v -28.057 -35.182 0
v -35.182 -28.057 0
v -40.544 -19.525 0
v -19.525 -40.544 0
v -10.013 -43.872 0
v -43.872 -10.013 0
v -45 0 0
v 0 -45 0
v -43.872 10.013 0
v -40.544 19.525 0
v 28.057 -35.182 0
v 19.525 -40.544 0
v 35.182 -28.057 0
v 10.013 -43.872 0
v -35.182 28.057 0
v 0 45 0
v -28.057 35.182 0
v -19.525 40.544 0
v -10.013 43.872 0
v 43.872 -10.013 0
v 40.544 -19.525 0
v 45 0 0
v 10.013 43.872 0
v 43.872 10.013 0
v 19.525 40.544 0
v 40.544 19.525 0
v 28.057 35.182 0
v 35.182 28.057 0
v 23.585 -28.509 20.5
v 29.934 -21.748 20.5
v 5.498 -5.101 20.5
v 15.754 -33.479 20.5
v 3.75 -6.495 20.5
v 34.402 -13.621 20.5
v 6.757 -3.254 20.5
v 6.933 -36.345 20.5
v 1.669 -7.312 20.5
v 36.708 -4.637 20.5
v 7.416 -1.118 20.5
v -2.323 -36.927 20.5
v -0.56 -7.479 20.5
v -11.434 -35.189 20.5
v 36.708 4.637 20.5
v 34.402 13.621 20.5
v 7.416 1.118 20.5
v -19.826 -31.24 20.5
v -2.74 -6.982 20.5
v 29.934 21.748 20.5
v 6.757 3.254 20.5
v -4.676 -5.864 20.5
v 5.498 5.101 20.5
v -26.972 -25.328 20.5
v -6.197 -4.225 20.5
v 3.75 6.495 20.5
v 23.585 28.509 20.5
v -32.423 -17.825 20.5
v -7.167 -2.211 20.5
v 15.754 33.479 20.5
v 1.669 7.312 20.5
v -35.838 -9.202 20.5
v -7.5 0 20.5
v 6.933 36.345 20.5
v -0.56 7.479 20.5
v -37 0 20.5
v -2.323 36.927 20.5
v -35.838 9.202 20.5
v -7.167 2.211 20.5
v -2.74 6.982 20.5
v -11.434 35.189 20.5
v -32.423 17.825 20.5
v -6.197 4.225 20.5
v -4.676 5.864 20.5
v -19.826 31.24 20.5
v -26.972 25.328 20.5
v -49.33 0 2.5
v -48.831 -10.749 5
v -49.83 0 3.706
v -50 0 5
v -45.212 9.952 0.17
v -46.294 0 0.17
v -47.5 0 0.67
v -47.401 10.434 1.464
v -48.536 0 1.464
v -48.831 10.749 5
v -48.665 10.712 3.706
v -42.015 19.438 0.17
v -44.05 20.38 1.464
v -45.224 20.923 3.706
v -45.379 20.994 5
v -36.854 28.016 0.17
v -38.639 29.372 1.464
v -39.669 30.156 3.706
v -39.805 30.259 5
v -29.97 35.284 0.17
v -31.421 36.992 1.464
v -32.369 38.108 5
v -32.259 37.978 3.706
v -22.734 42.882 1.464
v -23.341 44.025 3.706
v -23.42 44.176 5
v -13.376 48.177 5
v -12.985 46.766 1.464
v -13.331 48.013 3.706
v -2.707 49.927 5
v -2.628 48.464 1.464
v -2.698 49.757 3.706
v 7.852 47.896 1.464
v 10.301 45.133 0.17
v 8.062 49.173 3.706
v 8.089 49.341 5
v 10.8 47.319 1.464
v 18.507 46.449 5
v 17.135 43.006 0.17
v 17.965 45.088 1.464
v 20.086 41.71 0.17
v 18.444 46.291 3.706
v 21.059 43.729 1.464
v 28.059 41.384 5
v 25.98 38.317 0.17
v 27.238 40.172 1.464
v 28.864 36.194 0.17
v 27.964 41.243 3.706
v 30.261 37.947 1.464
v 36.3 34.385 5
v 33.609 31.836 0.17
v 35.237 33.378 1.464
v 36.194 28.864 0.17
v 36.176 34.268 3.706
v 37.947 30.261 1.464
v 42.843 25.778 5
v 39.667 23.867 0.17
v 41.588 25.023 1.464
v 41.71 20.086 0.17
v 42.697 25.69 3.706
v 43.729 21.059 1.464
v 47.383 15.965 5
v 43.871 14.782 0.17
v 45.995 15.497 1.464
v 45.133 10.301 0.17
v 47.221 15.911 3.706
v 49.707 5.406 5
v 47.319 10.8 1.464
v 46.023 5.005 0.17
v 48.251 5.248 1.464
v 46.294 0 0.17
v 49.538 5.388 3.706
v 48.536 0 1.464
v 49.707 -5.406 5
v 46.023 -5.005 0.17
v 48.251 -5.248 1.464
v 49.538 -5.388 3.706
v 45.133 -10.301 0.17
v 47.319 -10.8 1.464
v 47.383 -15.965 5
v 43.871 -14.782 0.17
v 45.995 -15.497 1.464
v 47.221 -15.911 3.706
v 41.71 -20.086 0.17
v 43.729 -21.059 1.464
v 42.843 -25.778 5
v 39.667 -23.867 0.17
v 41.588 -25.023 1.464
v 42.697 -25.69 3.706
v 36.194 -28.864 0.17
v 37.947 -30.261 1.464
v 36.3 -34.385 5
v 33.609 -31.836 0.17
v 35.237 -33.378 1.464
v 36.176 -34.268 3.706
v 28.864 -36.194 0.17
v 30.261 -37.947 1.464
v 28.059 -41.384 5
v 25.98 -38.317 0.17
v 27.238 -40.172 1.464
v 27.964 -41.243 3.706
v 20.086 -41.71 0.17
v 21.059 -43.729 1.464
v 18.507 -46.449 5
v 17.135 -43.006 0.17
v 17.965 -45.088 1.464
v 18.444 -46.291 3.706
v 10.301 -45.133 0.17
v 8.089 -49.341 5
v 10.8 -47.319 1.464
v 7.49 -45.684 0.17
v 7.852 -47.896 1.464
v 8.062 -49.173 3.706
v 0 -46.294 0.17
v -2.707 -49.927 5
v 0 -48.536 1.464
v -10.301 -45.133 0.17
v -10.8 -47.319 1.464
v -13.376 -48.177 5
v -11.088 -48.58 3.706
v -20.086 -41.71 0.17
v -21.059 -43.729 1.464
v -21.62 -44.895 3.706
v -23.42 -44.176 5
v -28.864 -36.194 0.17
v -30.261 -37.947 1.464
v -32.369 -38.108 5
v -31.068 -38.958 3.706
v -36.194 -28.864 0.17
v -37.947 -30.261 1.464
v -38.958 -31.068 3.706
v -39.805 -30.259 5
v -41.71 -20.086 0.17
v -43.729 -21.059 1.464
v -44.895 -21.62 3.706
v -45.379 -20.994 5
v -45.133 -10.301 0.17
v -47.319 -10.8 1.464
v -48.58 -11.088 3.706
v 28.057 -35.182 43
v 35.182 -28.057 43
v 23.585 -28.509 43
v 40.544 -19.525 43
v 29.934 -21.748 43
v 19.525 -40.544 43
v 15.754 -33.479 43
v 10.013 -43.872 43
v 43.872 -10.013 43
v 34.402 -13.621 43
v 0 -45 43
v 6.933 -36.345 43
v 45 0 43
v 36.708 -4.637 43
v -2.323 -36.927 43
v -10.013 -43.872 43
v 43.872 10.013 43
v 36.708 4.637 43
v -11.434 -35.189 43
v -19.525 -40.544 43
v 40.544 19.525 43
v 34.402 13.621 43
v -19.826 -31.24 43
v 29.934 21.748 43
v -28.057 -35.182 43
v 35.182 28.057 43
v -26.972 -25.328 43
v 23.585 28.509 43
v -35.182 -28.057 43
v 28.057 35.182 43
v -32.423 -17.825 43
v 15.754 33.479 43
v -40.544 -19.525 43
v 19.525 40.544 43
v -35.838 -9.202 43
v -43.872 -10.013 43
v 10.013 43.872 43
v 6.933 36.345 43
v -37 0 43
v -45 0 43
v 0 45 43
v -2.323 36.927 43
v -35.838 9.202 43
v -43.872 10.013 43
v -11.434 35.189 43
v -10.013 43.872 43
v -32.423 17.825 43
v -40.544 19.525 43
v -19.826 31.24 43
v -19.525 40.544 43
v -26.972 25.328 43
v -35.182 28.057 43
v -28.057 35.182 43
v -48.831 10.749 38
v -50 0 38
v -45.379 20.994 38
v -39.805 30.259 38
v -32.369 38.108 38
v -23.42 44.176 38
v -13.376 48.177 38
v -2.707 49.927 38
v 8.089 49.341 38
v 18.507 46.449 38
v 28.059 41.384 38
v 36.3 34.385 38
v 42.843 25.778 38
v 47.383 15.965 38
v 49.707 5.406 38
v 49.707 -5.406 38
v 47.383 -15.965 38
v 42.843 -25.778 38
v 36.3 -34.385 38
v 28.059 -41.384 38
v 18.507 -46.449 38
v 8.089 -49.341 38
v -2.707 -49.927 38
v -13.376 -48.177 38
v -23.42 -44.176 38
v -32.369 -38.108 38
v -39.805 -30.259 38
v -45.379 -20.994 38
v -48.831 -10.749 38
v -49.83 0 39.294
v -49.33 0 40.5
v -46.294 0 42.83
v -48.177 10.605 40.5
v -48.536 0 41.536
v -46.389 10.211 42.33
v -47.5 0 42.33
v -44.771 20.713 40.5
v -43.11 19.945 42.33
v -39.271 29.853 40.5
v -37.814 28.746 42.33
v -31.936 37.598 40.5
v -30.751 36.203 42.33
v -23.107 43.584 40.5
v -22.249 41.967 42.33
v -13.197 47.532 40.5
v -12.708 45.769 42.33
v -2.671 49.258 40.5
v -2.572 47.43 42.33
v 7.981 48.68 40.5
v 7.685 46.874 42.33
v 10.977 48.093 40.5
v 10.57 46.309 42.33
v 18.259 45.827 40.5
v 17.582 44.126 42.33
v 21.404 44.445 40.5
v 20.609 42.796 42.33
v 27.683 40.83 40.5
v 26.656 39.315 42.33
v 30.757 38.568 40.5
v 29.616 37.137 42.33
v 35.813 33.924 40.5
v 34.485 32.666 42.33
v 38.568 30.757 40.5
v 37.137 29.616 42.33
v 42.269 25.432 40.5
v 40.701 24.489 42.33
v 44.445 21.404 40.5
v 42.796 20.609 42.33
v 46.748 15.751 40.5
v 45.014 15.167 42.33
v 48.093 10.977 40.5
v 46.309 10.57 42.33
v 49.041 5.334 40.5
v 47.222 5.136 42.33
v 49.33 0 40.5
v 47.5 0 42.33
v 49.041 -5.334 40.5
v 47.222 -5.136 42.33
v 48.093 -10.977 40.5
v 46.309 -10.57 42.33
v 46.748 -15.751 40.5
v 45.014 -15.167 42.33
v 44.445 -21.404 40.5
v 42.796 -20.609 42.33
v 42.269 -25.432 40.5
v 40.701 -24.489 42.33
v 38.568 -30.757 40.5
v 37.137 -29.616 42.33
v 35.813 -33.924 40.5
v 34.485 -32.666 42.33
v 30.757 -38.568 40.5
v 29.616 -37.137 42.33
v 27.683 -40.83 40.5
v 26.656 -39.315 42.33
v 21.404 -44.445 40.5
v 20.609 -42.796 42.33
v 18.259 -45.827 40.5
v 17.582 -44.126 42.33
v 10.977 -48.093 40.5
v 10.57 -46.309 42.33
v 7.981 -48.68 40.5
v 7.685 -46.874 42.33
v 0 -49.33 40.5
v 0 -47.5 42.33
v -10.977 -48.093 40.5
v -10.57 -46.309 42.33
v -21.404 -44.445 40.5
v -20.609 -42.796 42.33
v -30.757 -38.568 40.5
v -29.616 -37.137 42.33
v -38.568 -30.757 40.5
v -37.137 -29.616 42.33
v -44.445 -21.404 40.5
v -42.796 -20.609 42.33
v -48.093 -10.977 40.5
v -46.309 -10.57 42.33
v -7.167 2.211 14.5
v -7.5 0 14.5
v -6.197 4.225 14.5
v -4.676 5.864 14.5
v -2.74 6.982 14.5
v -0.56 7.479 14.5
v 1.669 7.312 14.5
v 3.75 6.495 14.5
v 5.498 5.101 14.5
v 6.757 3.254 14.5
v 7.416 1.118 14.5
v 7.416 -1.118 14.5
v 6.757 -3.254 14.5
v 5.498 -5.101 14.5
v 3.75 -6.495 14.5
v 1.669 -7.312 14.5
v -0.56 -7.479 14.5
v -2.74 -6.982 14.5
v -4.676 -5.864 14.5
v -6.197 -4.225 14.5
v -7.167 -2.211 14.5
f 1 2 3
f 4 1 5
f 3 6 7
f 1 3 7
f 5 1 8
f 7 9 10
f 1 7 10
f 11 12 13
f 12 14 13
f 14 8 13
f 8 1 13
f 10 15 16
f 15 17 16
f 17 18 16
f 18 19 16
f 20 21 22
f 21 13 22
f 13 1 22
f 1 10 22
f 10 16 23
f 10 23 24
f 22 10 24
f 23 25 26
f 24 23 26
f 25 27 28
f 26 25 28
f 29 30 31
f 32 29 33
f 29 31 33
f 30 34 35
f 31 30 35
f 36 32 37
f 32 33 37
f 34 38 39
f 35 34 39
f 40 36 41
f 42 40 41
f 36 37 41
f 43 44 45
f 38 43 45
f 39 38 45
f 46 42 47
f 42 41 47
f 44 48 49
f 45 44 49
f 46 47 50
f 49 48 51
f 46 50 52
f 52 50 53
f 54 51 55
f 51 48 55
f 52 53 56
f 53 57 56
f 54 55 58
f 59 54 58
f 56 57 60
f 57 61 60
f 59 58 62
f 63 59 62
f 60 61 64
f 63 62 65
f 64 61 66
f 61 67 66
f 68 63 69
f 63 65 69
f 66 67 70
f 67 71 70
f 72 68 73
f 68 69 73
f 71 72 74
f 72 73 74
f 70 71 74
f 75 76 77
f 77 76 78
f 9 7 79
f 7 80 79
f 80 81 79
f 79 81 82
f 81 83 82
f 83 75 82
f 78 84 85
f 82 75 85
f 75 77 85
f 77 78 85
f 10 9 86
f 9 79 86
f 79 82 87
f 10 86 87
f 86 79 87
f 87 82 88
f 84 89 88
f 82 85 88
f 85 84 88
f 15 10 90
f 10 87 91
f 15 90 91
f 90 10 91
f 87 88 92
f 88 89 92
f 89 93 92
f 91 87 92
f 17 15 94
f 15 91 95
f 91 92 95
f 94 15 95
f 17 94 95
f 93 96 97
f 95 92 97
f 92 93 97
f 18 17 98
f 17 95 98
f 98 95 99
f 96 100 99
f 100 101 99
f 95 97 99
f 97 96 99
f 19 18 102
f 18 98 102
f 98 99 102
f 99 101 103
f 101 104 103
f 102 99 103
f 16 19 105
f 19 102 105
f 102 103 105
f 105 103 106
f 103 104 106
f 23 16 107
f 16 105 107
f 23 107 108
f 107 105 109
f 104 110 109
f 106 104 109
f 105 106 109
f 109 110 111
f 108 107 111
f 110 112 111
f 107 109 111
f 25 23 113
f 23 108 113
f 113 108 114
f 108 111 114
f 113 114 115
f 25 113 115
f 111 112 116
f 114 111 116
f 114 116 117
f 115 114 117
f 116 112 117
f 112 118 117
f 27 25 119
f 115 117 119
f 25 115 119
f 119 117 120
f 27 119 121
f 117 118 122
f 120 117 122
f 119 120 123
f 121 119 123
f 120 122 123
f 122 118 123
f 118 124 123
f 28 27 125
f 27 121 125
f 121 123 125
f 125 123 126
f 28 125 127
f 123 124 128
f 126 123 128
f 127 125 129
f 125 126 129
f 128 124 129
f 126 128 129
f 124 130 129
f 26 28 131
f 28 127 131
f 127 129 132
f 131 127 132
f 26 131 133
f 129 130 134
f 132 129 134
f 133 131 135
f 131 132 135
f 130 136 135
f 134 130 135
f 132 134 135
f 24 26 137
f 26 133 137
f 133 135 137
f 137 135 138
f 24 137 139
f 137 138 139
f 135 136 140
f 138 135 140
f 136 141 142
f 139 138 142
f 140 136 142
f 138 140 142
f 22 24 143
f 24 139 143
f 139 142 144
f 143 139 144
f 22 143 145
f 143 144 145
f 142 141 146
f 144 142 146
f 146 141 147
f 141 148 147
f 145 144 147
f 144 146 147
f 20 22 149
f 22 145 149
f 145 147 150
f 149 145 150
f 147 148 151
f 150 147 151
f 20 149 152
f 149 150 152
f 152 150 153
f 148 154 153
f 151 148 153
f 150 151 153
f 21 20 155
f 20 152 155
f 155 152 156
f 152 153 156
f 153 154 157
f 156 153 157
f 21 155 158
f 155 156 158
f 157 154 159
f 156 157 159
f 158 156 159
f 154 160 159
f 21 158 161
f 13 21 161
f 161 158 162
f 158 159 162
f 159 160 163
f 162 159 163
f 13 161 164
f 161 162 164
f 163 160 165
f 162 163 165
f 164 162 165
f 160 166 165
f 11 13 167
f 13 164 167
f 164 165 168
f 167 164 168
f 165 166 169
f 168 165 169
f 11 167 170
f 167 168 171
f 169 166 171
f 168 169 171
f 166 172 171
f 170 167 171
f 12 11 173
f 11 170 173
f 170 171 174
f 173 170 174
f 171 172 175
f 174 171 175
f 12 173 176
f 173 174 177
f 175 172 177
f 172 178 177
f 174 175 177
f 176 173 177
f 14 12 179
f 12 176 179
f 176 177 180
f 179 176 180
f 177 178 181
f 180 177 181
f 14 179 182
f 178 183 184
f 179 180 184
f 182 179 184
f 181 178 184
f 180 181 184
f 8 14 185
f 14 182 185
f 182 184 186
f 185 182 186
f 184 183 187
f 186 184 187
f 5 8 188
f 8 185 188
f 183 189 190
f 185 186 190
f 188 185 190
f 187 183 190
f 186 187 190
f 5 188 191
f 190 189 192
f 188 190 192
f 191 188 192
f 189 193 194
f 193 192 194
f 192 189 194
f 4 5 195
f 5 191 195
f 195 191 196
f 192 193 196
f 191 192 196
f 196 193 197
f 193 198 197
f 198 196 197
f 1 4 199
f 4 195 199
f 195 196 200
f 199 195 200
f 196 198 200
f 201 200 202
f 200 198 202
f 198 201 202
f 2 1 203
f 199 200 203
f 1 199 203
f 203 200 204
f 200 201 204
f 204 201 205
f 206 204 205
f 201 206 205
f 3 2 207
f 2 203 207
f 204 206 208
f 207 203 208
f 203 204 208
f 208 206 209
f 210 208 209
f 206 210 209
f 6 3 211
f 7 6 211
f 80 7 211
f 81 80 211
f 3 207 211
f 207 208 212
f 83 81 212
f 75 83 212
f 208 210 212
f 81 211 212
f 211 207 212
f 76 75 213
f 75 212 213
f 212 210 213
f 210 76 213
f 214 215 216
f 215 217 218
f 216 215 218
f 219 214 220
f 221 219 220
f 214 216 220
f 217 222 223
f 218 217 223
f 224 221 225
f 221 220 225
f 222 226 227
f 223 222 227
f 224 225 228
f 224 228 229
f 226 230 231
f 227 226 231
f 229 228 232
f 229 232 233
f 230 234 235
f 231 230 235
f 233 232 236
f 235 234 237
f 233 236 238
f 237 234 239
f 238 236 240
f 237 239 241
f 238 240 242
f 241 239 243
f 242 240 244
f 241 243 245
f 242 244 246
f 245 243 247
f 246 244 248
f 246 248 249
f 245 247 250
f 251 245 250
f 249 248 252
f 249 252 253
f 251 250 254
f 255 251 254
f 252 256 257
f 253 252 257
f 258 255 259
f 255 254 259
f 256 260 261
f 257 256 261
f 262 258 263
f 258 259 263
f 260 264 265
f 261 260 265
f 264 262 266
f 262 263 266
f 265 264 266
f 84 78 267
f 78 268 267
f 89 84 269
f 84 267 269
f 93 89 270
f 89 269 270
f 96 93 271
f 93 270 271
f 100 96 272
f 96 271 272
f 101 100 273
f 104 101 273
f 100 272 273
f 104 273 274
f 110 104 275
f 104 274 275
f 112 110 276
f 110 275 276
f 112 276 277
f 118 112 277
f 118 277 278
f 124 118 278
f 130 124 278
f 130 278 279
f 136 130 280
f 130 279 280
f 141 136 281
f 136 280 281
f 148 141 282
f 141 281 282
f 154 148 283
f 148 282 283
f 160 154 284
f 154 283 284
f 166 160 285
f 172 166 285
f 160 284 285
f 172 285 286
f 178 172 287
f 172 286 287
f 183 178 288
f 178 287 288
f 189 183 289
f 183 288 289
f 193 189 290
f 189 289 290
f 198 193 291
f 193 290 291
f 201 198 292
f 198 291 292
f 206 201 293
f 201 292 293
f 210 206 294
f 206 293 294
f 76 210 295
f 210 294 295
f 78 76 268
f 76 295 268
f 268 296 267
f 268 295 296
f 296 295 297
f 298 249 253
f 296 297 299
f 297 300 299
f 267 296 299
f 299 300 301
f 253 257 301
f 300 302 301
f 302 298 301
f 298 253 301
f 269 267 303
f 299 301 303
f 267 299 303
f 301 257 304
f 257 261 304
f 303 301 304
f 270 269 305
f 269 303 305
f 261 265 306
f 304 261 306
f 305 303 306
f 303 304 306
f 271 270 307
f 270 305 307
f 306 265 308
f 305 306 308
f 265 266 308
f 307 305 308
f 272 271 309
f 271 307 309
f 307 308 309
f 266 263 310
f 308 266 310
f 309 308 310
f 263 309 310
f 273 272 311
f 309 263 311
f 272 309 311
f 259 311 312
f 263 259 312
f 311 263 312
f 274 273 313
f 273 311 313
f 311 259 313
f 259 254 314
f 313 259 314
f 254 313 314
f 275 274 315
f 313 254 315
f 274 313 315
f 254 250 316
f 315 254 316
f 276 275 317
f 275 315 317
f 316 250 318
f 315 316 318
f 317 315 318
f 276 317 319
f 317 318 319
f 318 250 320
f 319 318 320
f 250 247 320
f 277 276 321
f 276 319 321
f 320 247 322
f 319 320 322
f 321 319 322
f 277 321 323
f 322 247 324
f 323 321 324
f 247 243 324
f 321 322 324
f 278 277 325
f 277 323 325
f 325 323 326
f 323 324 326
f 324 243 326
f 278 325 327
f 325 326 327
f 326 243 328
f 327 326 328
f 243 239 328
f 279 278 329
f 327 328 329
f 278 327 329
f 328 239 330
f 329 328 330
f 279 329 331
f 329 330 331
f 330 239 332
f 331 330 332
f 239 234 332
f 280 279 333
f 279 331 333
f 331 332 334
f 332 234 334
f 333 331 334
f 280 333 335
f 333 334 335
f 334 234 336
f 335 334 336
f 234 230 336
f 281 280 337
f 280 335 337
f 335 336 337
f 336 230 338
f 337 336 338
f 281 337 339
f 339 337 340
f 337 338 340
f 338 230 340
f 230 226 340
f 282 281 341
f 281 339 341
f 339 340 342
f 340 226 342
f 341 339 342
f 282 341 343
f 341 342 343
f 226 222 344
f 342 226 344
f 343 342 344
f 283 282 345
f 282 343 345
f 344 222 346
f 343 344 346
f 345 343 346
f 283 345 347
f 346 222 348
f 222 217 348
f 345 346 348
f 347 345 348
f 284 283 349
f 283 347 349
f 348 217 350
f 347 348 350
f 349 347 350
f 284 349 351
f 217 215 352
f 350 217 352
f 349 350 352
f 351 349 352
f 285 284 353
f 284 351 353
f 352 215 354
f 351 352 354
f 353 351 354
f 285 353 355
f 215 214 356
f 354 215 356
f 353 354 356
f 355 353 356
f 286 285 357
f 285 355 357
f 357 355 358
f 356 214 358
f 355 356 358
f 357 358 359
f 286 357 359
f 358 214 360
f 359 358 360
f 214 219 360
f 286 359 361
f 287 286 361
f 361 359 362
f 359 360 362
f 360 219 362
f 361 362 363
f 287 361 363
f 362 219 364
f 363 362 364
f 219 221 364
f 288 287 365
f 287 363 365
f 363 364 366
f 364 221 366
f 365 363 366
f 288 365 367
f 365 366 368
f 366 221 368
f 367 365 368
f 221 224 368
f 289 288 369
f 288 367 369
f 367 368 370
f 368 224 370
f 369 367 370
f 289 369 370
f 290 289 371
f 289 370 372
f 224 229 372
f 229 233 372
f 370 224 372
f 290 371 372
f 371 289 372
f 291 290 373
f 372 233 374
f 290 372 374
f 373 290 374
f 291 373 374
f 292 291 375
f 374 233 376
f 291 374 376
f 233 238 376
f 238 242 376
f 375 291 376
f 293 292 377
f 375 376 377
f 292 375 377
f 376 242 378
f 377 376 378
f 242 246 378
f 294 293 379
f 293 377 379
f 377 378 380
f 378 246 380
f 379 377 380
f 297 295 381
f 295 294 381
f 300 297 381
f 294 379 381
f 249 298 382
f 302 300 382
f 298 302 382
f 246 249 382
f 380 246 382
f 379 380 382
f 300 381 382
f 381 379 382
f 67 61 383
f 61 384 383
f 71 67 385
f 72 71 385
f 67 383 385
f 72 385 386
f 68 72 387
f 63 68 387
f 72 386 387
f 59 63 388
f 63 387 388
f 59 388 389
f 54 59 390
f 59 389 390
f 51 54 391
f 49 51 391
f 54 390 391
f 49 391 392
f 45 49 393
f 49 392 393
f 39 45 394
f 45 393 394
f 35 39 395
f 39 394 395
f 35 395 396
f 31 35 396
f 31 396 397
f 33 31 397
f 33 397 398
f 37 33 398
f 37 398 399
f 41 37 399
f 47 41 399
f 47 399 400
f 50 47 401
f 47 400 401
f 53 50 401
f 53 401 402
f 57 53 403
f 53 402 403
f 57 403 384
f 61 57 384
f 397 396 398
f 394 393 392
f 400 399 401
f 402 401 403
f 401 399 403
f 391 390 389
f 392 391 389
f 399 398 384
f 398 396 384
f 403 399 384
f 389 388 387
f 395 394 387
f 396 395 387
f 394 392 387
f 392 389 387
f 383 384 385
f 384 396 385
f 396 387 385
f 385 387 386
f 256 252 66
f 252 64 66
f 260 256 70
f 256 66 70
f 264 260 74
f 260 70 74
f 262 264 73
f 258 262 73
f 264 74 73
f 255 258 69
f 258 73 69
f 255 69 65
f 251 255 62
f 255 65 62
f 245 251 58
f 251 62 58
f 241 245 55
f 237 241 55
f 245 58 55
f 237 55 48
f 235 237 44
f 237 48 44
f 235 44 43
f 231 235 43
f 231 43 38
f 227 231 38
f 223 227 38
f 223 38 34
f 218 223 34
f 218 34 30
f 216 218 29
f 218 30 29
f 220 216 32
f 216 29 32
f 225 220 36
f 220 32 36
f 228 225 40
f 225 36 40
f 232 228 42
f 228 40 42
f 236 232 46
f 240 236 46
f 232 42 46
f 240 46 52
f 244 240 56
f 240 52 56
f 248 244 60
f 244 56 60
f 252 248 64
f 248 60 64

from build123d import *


with BuildPart() as part:
    # Sketch1 → Revolve1 (revolve)
    with BuildSketch(Plane.XZ, mode=Mode.PRIVATE) as revolve1_sk:
        with BuildLine():
            Line((7.5, 14.5), (0, 14.5))
            Line((0, 14.5), (0, 0))
            Line((0, 0), (45, 0))
            ThreePointArc((45, 0), (48.535533906, 1.464466094), (50, 5))
            Line((50, 5), (50, 38))
            ThreePointArc((50, 38), (48.535533906, 41.535533906), (45, 43))
            Line((45, 43), (37, 43))
            Line((37, 43), (37, 20.5))
            Line((37, 20.5), (7.5, 20.5))
            Line((7.5, 20.5), (7.5, 14.5))
        make_face()
    revolve(revolve1_sk.sketch.rotate(Axis((0, 0, 43), (0, 0, -1)), 180), axis=Axis((0, 0, 43), (0, 0, -1)))


solid = part.part
